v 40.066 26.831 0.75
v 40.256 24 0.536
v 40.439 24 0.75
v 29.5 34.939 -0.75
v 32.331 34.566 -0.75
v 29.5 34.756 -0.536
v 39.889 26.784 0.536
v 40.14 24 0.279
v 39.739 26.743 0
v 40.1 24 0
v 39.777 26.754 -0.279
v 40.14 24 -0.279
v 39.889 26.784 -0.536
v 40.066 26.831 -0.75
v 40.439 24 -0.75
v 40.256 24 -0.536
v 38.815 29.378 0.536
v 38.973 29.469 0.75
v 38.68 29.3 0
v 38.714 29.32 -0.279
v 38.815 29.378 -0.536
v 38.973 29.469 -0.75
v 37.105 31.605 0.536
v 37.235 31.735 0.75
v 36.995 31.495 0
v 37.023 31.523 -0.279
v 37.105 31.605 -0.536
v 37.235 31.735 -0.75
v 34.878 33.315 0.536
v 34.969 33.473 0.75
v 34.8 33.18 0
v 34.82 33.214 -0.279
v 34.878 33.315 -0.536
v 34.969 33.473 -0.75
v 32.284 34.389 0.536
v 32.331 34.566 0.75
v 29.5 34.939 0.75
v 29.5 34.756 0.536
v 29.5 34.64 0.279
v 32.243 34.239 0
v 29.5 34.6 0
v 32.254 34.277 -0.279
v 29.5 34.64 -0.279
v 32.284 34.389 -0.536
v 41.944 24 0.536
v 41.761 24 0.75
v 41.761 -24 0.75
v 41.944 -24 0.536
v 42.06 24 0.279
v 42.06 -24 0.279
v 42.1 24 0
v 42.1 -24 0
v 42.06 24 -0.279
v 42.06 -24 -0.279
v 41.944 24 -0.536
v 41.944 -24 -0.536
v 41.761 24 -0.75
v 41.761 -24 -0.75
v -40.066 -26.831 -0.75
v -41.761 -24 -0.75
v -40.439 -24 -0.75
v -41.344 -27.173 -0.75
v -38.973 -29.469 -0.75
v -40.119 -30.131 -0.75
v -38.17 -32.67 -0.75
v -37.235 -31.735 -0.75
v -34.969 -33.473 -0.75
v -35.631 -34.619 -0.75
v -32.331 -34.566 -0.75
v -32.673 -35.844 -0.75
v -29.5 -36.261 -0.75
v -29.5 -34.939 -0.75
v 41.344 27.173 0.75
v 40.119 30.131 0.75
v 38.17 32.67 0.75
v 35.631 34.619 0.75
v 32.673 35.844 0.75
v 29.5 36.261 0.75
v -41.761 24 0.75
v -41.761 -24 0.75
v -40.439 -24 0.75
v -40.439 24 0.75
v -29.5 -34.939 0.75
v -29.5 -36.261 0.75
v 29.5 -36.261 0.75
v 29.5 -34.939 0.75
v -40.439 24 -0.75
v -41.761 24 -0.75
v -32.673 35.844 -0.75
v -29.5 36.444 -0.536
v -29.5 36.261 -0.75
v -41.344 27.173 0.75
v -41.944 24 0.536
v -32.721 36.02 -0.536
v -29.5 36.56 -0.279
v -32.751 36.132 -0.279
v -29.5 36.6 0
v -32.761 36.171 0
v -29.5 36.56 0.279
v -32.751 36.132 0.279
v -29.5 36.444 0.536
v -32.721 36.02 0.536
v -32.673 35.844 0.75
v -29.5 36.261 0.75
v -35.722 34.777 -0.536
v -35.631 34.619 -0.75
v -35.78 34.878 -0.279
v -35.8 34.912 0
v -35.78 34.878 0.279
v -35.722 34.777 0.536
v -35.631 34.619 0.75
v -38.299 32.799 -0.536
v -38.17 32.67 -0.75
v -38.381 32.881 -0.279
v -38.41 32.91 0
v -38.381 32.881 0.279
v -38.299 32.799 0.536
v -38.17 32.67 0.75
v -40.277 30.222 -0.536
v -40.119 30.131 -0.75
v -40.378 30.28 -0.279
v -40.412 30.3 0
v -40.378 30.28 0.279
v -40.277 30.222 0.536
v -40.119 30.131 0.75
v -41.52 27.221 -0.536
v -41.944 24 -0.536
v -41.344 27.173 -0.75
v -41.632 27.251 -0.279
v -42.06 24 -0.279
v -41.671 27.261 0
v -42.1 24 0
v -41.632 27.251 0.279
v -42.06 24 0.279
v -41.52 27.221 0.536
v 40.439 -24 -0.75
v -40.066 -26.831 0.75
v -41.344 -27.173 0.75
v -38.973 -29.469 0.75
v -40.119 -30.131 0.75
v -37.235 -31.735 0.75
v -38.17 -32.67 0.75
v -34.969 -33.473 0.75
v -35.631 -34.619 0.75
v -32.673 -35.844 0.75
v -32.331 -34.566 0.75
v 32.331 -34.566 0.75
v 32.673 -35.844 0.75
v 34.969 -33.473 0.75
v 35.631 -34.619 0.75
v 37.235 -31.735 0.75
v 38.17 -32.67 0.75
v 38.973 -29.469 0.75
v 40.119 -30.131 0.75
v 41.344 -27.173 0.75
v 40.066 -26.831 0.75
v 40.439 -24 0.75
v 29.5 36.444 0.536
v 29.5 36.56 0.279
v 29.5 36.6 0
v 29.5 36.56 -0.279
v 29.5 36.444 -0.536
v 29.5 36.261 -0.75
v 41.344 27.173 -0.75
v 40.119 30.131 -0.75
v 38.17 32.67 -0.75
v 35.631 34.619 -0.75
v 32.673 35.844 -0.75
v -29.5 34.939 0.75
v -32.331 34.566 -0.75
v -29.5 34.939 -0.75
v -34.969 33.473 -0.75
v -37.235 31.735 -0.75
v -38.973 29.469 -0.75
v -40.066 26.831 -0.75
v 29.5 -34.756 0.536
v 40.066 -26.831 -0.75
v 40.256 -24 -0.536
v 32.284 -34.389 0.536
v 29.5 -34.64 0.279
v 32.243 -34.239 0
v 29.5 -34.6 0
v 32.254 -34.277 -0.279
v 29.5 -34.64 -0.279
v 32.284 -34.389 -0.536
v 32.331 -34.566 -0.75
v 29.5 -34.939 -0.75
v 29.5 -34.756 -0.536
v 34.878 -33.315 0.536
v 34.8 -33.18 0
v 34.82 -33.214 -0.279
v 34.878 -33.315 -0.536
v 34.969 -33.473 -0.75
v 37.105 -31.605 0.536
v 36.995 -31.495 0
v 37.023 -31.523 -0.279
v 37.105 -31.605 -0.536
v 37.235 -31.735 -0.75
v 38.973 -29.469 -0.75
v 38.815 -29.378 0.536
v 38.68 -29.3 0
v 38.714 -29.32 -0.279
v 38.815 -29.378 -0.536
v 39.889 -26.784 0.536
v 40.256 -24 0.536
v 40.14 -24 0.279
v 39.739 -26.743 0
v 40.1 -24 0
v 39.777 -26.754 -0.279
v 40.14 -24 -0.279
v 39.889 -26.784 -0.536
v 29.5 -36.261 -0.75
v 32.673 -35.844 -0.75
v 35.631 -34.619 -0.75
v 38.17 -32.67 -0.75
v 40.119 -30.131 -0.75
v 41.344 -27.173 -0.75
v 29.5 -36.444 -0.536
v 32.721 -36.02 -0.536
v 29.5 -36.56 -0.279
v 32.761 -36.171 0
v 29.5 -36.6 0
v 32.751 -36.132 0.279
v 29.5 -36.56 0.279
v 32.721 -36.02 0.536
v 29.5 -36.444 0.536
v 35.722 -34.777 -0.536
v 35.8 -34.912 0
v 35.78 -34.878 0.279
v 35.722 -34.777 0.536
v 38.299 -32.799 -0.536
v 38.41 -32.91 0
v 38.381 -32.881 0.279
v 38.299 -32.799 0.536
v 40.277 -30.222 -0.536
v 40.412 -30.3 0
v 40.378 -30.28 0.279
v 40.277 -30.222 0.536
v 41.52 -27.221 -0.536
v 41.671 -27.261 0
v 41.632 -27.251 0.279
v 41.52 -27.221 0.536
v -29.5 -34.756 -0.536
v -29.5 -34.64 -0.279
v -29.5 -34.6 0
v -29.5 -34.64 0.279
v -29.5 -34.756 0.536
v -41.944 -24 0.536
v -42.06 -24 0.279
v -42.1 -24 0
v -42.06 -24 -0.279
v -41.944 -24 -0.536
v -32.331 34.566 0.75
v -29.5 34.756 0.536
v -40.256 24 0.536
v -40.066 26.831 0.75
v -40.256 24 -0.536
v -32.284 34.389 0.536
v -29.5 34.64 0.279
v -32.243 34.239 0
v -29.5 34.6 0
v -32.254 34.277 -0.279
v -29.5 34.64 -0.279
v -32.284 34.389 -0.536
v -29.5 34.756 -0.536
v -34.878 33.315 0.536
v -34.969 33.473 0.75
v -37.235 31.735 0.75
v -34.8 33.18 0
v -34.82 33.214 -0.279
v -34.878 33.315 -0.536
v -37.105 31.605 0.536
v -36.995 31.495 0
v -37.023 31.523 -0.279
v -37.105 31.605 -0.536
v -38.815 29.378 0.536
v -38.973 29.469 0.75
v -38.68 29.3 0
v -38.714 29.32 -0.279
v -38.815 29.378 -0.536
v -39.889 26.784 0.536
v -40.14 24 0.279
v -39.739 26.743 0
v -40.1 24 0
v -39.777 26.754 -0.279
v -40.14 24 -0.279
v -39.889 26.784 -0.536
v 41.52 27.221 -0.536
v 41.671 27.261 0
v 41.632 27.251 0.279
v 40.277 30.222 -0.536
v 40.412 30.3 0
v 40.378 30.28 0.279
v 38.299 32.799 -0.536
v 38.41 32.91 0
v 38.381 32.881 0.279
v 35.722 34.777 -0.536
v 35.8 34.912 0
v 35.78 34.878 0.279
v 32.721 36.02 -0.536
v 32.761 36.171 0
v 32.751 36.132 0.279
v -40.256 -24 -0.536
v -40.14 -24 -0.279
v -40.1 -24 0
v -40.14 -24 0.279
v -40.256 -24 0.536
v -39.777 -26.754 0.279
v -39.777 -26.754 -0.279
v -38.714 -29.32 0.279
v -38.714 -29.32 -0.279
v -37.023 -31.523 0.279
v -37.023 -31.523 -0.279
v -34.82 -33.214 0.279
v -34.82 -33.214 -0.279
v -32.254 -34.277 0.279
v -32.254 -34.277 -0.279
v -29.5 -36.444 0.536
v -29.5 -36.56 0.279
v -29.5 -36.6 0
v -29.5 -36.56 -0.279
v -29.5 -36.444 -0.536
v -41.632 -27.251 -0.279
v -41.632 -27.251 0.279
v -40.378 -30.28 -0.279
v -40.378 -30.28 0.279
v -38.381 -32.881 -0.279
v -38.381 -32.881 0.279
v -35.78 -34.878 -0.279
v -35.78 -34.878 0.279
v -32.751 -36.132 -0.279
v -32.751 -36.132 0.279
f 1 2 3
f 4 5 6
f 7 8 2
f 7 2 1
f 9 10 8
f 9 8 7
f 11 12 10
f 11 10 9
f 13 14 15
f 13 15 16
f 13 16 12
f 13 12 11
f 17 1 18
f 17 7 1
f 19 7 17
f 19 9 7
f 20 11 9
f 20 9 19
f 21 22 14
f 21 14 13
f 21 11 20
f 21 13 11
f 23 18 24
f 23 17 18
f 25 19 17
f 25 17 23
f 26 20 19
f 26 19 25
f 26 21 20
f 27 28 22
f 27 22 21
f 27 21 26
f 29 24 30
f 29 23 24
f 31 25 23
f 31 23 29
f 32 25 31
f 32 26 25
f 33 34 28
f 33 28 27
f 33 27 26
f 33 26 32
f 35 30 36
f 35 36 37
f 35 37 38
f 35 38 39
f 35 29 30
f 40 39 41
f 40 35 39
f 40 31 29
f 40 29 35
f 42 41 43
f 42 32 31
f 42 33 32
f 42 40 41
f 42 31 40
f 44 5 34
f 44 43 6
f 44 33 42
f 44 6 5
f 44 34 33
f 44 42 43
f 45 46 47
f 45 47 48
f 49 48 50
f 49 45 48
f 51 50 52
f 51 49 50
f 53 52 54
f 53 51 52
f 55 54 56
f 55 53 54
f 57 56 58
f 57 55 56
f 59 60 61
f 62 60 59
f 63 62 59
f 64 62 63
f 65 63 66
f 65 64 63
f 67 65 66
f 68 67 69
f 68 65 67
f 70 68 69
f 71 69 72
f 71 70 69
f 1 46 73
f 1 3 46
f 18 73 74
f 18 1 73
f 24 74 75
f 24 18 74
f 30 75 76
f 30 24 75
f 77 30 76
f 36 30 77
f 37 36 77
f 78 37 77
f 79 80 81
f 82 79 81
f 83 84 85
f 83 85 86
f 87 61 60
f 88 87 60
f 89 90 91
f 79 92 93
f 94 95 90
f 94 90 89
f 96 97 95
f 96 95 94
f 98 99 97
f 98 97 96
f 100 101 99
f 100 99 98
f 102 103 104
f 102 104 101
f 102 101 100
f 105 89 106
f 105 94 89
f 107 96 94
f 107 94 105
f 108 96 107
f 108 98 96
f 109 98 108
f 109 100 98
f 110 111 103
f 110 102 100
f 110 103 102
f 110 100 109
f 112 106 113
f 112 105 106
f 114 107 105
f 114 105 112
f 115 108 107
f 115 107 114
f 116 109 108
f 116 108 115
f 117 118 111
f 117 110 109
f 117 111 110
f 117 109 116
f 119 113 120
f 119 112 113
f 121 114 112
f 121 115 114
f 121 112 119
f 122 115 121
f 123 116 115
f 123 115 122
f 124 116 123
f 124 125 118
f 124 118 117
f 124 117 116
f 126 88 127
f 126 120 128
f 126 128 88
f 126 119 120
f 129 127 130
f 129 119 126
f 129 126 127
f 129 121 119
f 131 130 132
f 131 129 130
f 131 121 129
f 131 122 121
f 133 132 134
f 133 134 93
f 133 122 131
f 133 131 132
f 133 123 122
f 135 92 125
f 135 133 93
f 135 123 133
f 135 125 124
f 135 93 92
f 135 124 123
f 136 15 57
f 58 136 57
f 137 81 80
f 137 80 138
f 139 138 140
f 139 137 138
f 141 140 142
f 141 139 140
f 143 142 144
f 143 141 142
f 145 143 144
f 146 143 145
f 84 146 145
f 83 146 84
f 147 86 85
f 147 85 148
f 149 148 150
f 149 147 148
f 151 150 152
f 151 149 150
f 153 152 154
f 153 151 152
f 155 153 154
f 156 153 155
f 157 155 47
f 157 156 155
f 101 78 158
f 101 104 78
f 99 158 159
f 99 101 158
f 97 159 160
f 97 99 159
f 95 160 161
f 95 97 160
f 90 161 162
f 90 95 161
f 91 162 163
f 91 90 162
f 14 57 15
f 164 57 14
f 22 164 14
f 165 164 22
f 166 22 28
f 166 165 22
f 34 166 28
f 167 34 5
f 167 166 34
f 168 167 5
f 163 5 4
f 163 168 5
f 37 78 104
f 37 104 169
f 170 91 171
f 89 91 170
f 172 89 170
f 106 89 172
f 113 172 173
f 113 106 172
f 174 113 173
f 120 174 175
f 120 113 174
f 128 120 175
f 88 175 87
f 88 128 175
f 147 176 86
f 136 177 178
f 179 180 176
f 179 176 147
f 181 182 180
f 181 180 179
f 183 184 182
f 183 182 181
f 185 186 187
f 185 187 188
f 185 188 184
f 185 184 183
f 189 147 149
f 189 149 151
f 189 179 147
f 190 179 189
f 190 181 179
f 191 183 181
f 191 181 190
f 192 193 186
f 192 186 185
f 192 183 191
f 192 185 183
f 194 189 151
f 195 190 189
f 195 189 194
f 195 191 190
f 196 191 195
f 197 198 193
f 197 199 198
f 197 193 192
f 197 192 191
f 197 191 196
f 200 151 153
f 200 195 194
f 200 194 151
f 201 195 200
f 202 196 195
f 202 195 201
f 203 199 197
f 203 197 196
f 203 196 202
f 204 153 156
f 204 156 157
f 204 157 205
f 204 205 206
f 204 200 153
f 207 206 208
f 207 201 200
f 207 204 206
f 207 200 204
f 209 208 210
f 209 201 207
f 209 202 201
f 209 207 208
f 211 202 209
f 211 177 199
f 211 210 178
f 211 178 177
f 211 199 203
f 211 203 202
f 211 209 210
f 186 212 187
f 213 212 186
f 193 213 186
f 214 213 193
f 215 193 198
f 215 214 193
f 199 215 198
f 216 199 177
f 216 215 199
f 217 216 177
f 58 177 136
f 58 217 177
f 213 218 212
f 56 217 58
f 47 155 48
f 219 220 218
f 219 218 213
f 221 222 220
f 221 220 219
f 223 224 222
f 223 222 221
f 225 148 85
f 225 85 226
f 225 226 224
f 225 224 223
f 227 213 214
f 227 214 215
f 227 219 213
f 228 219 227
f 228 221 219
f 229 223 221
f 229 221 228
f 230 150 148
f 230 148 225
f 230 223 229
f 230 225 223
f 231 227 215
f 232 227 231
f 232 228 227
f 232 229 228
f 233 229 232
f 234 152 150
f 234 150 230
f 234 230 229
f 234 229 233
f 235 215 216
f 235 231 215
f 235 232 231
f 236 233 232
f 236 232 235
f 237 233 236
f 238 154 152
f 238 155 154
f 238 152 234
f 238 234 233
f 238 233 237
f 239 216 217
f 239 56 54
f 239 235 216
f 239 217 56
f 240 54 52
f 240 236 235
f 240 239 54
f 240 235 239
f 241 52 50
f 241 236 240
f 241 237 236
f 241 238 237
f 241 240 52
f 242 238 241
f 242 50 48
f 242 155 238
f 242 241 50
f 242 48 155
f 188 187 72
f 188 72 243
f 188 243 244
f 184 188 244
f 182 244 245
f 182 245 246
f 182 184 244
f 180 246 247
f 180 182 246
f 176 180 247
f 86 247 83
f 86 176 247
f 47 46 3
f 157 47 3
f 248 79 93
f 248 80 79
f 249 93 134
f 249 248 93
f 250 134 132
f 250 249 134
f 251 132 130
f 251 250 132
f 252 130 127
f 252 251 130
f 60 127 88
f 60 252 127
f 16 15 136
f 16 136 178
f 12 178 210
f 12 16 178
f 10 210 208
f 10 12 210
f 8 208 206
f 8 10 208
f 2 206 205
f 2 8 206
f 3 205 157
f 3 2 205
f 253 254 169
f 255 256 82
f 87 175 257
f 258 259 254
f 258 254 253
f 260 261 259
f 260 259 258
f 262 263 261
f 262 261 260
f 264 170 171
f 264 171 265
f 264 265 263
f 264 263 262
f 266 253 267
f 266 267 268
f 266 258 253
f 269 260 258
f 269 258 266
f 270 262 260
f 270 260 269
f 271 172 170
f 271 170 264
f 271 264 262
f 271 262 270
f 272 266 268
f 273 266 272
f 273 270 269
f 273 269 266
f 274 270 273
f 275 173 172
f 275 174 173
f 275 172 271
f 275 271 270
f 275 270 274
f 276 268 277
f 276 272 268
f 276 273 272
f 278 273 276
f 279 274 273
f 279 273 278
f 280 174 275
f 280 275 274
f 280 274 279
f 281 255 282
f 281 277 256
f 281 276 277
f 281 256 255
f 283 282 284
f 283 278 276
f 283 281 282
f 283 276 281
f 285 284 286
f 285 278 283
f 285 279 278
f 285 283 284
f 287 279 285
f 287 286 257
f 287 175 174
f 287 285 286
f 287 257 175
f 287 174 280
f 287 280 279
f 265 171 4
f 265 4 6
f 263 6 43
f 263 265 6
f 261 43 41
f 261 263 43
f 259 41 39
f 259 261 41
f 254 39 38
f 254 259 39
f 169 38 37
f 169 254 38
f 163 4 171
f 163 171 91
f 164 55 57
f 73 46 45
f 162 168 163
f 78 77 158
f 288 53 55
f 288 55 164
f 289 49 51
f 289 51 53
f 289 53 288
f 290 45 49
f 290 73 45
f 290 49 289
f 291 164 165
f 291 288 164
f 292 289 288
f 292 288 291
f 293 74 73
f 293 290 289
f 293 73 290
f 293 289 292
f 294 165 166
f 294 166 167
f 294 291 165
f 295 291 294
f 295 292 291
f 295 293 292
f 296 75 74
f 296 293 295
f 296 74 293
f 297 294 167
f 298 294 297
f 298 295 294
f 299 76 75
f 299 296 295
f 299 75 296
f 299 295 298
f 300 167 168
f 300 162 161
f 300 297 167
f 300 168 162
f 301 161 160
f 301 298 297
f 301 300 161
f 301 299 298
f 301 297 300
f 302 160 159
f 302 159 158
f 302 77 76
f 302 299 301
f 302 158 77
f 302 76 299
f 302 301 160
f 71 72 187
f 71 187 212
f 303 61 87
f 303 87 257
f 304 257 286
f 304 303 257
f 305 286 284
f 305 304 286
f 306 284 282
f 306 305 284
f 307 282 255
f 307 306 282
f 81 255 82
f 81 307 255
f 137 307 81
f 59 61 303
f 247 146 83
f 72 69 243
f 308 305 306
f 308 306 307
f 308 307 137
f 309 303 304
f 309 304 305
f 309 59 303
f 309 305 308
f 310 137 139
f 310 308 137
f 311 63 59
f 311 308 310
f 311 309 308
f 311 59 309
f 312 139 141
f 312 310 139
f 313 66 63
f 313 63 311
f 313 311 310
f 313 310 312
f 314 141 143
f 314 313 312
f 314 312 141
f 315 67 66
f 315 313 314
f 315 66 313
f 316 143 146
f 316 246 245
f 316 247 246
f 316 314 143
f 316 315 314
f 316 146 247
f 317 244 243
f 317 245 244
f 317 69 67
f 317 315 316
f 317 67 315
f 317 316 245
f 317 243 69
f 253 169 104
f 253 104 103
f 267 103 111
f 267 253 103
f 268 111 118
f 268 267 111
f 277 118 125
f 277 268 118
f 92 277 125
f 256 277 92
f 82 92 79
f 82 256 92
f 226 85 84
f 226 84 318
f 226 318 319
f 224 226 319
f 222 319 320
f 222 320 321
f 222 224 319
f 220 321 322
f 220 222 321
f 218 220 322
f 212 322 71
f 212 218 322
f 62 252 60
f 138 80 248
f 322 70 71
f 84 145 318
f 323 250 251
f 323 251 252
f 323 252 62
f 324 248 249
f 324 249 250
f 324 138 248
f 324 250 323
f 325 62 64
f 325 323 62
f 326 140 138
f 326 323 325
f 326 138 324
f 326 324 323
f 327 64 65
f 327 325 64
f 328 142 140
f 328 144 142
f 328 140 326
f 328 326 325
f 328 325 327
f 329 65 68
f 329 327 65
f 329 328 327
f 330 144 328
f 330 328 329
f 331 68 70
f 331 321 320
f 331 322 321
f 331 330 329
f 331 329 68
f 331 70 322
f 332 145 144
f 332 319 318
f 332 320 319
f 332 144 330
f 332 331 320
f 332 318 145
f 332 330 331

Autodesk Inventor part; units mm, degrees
ref_plane "YZ Plane" through (0, 0, 0) normal (1, 0, 0) x (0, 1, 0)
ref_plane "XZ Plane" through (0, 0, 0) normal (0, 1, 0) x (-1, 0, 0)
ref_plane "XY Plane" through (0, 0, 0) normal (0, 0, 1) x (1, 0, 0)
sketch "Sketch1" plane through (0, 0, 0) normal (0, 0, 1) x (1, 0, 0)
  line L0 (-29.5, -34.6) -> (29.5, -34.6)
  line L1 (40.1, -24) -> (40.1, 24)
  line L2 (29.5, 34.6) -> (-29.5, 34.6)
  line L3 (-40.1, 24) -> (-40.1, -24)
  line L4 (-40.1, -34.6) -> (40.1, 34.6) construction
  line L5 (40.1, -34.6) -> (-40.1, 34.6) construction
  arc A0 (-29.5, 34.6) -> (-40.1, 24) centre (-29.5, 24) ccw
  arc A1 (-40.1, -24) -> (-29.5, -34.6) centre (-29.5, -24) ccw
  arc A2 (29.5, -34.6) -> (40.1, -24) centre (29.5, -24) ccw
  arc A3 (40.1, 24) -> (29.5, 34.6) centre (29.5, 24) ccw
  point P0 (0, 0)
  dimension "d0" = 69.2
  dimension "d1" = 80.2
  dimension "d2" = 10.6
sketch "Sketch2" plane through (0, 0, 0) normal (0, 1, 0) x (-1, 0, 0)
  line L0 (41.7614, 0.75) -> (40.4386, 0.75)
  arc A0 (40.4386, 0.75) -> (40.4386, -0.75) centre (41.1, 0) ccw
  arc A1 (41.7614, -0.75) -> (41.7614, 0.75) centre (41.1, 0) ccw
  line L1 (41.7614, -0.75) -> (40.4386, -0.75)
  point P0 (0, 0)
  point P1 (40.1, 0)
  point P2 (40.1, 0)
  point P3 (40.1, 0)
  point P4 (41.1, 0.75)
  dimension "d3" = 1.5
  dimension "d4" = 1
sweep "Sweep1" add profiles "Sketch2" path "Sketch1"
properties part number "PayloadGermination_Seal" material "Rubber"
